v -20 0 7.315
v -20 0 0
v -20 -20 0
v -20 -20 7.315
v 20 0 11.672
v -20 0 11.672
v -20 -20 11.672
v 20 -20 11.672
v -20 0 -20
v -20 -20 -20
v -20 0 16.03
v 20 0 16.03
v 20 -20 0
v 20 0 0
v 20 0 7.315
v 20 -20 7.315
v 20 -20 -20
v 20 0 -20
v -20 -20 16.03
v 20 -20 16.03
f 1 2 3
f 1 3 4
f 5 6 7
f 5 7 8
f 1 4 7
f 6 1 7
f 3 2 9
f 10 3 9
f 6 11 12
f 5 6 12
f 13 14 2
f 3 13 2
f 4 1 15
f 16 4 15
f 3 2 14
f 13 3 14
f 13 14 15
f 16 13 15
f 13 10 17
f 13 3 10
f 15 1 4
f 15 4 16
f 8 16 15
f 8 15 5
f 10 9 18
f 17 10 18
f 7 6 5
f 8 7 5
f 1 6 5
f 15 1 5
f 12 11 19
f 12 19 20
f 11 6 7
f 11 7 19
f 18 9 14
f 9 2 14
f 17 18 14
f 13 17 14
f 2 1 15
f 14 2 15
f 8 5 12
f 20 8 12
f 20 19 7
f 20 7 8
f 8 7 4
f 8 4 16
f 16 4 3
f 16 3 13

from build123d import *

# Parameters (mm, degrees)
F1_DEPTH = 20
F0_W     = 40
F0_H     = 7.314723
F2_DEPTH = 20
F0_H_2   = 4.357709
F3_DEPTH = 20
F0_H_3   = 4.357706
F4_DEPTH = 20


with BuildPart() as f1:
    # F0 (on Front) → F1 (new body)
    with BuildSketch(Plane.XZ):
        Polygon((-20, -20), (0, -20), (20, -20), (20, 0), (-20, 0), align=None)
    extrude(amount=F1_DEPTH)


with BuildPart() as f2:
    # F0 (on Front) → F2 (new body)
    with BuildSketch(Plane.XZ):
        with Locations((0, 3.657361)):
            Rectangle(F0_W, F0_H)
    extrude(amount=F2_DEPTH)


with BuildPart() as f3:
    # F0 (on Front) → F3 (new body)
    with BuildSketch(Plane.XZ):
        with Locations((0, 9.493577)):
            Rectangle(F0_W, F0_H_2)
    extrude(amount=F3_DEPTH)


with BuildPart() as f4:
    # F0 (on Front) → F4 (new body)
    with BuildSketch(Plane.XZ):
        with Locations((0, 13.851285)):
            Rectangle(F0_W, F0_H_3)
    extrude(amount=F4_DEPTH)


solid = Compound([f1.part, f2.part, f3.part, f4.part])
